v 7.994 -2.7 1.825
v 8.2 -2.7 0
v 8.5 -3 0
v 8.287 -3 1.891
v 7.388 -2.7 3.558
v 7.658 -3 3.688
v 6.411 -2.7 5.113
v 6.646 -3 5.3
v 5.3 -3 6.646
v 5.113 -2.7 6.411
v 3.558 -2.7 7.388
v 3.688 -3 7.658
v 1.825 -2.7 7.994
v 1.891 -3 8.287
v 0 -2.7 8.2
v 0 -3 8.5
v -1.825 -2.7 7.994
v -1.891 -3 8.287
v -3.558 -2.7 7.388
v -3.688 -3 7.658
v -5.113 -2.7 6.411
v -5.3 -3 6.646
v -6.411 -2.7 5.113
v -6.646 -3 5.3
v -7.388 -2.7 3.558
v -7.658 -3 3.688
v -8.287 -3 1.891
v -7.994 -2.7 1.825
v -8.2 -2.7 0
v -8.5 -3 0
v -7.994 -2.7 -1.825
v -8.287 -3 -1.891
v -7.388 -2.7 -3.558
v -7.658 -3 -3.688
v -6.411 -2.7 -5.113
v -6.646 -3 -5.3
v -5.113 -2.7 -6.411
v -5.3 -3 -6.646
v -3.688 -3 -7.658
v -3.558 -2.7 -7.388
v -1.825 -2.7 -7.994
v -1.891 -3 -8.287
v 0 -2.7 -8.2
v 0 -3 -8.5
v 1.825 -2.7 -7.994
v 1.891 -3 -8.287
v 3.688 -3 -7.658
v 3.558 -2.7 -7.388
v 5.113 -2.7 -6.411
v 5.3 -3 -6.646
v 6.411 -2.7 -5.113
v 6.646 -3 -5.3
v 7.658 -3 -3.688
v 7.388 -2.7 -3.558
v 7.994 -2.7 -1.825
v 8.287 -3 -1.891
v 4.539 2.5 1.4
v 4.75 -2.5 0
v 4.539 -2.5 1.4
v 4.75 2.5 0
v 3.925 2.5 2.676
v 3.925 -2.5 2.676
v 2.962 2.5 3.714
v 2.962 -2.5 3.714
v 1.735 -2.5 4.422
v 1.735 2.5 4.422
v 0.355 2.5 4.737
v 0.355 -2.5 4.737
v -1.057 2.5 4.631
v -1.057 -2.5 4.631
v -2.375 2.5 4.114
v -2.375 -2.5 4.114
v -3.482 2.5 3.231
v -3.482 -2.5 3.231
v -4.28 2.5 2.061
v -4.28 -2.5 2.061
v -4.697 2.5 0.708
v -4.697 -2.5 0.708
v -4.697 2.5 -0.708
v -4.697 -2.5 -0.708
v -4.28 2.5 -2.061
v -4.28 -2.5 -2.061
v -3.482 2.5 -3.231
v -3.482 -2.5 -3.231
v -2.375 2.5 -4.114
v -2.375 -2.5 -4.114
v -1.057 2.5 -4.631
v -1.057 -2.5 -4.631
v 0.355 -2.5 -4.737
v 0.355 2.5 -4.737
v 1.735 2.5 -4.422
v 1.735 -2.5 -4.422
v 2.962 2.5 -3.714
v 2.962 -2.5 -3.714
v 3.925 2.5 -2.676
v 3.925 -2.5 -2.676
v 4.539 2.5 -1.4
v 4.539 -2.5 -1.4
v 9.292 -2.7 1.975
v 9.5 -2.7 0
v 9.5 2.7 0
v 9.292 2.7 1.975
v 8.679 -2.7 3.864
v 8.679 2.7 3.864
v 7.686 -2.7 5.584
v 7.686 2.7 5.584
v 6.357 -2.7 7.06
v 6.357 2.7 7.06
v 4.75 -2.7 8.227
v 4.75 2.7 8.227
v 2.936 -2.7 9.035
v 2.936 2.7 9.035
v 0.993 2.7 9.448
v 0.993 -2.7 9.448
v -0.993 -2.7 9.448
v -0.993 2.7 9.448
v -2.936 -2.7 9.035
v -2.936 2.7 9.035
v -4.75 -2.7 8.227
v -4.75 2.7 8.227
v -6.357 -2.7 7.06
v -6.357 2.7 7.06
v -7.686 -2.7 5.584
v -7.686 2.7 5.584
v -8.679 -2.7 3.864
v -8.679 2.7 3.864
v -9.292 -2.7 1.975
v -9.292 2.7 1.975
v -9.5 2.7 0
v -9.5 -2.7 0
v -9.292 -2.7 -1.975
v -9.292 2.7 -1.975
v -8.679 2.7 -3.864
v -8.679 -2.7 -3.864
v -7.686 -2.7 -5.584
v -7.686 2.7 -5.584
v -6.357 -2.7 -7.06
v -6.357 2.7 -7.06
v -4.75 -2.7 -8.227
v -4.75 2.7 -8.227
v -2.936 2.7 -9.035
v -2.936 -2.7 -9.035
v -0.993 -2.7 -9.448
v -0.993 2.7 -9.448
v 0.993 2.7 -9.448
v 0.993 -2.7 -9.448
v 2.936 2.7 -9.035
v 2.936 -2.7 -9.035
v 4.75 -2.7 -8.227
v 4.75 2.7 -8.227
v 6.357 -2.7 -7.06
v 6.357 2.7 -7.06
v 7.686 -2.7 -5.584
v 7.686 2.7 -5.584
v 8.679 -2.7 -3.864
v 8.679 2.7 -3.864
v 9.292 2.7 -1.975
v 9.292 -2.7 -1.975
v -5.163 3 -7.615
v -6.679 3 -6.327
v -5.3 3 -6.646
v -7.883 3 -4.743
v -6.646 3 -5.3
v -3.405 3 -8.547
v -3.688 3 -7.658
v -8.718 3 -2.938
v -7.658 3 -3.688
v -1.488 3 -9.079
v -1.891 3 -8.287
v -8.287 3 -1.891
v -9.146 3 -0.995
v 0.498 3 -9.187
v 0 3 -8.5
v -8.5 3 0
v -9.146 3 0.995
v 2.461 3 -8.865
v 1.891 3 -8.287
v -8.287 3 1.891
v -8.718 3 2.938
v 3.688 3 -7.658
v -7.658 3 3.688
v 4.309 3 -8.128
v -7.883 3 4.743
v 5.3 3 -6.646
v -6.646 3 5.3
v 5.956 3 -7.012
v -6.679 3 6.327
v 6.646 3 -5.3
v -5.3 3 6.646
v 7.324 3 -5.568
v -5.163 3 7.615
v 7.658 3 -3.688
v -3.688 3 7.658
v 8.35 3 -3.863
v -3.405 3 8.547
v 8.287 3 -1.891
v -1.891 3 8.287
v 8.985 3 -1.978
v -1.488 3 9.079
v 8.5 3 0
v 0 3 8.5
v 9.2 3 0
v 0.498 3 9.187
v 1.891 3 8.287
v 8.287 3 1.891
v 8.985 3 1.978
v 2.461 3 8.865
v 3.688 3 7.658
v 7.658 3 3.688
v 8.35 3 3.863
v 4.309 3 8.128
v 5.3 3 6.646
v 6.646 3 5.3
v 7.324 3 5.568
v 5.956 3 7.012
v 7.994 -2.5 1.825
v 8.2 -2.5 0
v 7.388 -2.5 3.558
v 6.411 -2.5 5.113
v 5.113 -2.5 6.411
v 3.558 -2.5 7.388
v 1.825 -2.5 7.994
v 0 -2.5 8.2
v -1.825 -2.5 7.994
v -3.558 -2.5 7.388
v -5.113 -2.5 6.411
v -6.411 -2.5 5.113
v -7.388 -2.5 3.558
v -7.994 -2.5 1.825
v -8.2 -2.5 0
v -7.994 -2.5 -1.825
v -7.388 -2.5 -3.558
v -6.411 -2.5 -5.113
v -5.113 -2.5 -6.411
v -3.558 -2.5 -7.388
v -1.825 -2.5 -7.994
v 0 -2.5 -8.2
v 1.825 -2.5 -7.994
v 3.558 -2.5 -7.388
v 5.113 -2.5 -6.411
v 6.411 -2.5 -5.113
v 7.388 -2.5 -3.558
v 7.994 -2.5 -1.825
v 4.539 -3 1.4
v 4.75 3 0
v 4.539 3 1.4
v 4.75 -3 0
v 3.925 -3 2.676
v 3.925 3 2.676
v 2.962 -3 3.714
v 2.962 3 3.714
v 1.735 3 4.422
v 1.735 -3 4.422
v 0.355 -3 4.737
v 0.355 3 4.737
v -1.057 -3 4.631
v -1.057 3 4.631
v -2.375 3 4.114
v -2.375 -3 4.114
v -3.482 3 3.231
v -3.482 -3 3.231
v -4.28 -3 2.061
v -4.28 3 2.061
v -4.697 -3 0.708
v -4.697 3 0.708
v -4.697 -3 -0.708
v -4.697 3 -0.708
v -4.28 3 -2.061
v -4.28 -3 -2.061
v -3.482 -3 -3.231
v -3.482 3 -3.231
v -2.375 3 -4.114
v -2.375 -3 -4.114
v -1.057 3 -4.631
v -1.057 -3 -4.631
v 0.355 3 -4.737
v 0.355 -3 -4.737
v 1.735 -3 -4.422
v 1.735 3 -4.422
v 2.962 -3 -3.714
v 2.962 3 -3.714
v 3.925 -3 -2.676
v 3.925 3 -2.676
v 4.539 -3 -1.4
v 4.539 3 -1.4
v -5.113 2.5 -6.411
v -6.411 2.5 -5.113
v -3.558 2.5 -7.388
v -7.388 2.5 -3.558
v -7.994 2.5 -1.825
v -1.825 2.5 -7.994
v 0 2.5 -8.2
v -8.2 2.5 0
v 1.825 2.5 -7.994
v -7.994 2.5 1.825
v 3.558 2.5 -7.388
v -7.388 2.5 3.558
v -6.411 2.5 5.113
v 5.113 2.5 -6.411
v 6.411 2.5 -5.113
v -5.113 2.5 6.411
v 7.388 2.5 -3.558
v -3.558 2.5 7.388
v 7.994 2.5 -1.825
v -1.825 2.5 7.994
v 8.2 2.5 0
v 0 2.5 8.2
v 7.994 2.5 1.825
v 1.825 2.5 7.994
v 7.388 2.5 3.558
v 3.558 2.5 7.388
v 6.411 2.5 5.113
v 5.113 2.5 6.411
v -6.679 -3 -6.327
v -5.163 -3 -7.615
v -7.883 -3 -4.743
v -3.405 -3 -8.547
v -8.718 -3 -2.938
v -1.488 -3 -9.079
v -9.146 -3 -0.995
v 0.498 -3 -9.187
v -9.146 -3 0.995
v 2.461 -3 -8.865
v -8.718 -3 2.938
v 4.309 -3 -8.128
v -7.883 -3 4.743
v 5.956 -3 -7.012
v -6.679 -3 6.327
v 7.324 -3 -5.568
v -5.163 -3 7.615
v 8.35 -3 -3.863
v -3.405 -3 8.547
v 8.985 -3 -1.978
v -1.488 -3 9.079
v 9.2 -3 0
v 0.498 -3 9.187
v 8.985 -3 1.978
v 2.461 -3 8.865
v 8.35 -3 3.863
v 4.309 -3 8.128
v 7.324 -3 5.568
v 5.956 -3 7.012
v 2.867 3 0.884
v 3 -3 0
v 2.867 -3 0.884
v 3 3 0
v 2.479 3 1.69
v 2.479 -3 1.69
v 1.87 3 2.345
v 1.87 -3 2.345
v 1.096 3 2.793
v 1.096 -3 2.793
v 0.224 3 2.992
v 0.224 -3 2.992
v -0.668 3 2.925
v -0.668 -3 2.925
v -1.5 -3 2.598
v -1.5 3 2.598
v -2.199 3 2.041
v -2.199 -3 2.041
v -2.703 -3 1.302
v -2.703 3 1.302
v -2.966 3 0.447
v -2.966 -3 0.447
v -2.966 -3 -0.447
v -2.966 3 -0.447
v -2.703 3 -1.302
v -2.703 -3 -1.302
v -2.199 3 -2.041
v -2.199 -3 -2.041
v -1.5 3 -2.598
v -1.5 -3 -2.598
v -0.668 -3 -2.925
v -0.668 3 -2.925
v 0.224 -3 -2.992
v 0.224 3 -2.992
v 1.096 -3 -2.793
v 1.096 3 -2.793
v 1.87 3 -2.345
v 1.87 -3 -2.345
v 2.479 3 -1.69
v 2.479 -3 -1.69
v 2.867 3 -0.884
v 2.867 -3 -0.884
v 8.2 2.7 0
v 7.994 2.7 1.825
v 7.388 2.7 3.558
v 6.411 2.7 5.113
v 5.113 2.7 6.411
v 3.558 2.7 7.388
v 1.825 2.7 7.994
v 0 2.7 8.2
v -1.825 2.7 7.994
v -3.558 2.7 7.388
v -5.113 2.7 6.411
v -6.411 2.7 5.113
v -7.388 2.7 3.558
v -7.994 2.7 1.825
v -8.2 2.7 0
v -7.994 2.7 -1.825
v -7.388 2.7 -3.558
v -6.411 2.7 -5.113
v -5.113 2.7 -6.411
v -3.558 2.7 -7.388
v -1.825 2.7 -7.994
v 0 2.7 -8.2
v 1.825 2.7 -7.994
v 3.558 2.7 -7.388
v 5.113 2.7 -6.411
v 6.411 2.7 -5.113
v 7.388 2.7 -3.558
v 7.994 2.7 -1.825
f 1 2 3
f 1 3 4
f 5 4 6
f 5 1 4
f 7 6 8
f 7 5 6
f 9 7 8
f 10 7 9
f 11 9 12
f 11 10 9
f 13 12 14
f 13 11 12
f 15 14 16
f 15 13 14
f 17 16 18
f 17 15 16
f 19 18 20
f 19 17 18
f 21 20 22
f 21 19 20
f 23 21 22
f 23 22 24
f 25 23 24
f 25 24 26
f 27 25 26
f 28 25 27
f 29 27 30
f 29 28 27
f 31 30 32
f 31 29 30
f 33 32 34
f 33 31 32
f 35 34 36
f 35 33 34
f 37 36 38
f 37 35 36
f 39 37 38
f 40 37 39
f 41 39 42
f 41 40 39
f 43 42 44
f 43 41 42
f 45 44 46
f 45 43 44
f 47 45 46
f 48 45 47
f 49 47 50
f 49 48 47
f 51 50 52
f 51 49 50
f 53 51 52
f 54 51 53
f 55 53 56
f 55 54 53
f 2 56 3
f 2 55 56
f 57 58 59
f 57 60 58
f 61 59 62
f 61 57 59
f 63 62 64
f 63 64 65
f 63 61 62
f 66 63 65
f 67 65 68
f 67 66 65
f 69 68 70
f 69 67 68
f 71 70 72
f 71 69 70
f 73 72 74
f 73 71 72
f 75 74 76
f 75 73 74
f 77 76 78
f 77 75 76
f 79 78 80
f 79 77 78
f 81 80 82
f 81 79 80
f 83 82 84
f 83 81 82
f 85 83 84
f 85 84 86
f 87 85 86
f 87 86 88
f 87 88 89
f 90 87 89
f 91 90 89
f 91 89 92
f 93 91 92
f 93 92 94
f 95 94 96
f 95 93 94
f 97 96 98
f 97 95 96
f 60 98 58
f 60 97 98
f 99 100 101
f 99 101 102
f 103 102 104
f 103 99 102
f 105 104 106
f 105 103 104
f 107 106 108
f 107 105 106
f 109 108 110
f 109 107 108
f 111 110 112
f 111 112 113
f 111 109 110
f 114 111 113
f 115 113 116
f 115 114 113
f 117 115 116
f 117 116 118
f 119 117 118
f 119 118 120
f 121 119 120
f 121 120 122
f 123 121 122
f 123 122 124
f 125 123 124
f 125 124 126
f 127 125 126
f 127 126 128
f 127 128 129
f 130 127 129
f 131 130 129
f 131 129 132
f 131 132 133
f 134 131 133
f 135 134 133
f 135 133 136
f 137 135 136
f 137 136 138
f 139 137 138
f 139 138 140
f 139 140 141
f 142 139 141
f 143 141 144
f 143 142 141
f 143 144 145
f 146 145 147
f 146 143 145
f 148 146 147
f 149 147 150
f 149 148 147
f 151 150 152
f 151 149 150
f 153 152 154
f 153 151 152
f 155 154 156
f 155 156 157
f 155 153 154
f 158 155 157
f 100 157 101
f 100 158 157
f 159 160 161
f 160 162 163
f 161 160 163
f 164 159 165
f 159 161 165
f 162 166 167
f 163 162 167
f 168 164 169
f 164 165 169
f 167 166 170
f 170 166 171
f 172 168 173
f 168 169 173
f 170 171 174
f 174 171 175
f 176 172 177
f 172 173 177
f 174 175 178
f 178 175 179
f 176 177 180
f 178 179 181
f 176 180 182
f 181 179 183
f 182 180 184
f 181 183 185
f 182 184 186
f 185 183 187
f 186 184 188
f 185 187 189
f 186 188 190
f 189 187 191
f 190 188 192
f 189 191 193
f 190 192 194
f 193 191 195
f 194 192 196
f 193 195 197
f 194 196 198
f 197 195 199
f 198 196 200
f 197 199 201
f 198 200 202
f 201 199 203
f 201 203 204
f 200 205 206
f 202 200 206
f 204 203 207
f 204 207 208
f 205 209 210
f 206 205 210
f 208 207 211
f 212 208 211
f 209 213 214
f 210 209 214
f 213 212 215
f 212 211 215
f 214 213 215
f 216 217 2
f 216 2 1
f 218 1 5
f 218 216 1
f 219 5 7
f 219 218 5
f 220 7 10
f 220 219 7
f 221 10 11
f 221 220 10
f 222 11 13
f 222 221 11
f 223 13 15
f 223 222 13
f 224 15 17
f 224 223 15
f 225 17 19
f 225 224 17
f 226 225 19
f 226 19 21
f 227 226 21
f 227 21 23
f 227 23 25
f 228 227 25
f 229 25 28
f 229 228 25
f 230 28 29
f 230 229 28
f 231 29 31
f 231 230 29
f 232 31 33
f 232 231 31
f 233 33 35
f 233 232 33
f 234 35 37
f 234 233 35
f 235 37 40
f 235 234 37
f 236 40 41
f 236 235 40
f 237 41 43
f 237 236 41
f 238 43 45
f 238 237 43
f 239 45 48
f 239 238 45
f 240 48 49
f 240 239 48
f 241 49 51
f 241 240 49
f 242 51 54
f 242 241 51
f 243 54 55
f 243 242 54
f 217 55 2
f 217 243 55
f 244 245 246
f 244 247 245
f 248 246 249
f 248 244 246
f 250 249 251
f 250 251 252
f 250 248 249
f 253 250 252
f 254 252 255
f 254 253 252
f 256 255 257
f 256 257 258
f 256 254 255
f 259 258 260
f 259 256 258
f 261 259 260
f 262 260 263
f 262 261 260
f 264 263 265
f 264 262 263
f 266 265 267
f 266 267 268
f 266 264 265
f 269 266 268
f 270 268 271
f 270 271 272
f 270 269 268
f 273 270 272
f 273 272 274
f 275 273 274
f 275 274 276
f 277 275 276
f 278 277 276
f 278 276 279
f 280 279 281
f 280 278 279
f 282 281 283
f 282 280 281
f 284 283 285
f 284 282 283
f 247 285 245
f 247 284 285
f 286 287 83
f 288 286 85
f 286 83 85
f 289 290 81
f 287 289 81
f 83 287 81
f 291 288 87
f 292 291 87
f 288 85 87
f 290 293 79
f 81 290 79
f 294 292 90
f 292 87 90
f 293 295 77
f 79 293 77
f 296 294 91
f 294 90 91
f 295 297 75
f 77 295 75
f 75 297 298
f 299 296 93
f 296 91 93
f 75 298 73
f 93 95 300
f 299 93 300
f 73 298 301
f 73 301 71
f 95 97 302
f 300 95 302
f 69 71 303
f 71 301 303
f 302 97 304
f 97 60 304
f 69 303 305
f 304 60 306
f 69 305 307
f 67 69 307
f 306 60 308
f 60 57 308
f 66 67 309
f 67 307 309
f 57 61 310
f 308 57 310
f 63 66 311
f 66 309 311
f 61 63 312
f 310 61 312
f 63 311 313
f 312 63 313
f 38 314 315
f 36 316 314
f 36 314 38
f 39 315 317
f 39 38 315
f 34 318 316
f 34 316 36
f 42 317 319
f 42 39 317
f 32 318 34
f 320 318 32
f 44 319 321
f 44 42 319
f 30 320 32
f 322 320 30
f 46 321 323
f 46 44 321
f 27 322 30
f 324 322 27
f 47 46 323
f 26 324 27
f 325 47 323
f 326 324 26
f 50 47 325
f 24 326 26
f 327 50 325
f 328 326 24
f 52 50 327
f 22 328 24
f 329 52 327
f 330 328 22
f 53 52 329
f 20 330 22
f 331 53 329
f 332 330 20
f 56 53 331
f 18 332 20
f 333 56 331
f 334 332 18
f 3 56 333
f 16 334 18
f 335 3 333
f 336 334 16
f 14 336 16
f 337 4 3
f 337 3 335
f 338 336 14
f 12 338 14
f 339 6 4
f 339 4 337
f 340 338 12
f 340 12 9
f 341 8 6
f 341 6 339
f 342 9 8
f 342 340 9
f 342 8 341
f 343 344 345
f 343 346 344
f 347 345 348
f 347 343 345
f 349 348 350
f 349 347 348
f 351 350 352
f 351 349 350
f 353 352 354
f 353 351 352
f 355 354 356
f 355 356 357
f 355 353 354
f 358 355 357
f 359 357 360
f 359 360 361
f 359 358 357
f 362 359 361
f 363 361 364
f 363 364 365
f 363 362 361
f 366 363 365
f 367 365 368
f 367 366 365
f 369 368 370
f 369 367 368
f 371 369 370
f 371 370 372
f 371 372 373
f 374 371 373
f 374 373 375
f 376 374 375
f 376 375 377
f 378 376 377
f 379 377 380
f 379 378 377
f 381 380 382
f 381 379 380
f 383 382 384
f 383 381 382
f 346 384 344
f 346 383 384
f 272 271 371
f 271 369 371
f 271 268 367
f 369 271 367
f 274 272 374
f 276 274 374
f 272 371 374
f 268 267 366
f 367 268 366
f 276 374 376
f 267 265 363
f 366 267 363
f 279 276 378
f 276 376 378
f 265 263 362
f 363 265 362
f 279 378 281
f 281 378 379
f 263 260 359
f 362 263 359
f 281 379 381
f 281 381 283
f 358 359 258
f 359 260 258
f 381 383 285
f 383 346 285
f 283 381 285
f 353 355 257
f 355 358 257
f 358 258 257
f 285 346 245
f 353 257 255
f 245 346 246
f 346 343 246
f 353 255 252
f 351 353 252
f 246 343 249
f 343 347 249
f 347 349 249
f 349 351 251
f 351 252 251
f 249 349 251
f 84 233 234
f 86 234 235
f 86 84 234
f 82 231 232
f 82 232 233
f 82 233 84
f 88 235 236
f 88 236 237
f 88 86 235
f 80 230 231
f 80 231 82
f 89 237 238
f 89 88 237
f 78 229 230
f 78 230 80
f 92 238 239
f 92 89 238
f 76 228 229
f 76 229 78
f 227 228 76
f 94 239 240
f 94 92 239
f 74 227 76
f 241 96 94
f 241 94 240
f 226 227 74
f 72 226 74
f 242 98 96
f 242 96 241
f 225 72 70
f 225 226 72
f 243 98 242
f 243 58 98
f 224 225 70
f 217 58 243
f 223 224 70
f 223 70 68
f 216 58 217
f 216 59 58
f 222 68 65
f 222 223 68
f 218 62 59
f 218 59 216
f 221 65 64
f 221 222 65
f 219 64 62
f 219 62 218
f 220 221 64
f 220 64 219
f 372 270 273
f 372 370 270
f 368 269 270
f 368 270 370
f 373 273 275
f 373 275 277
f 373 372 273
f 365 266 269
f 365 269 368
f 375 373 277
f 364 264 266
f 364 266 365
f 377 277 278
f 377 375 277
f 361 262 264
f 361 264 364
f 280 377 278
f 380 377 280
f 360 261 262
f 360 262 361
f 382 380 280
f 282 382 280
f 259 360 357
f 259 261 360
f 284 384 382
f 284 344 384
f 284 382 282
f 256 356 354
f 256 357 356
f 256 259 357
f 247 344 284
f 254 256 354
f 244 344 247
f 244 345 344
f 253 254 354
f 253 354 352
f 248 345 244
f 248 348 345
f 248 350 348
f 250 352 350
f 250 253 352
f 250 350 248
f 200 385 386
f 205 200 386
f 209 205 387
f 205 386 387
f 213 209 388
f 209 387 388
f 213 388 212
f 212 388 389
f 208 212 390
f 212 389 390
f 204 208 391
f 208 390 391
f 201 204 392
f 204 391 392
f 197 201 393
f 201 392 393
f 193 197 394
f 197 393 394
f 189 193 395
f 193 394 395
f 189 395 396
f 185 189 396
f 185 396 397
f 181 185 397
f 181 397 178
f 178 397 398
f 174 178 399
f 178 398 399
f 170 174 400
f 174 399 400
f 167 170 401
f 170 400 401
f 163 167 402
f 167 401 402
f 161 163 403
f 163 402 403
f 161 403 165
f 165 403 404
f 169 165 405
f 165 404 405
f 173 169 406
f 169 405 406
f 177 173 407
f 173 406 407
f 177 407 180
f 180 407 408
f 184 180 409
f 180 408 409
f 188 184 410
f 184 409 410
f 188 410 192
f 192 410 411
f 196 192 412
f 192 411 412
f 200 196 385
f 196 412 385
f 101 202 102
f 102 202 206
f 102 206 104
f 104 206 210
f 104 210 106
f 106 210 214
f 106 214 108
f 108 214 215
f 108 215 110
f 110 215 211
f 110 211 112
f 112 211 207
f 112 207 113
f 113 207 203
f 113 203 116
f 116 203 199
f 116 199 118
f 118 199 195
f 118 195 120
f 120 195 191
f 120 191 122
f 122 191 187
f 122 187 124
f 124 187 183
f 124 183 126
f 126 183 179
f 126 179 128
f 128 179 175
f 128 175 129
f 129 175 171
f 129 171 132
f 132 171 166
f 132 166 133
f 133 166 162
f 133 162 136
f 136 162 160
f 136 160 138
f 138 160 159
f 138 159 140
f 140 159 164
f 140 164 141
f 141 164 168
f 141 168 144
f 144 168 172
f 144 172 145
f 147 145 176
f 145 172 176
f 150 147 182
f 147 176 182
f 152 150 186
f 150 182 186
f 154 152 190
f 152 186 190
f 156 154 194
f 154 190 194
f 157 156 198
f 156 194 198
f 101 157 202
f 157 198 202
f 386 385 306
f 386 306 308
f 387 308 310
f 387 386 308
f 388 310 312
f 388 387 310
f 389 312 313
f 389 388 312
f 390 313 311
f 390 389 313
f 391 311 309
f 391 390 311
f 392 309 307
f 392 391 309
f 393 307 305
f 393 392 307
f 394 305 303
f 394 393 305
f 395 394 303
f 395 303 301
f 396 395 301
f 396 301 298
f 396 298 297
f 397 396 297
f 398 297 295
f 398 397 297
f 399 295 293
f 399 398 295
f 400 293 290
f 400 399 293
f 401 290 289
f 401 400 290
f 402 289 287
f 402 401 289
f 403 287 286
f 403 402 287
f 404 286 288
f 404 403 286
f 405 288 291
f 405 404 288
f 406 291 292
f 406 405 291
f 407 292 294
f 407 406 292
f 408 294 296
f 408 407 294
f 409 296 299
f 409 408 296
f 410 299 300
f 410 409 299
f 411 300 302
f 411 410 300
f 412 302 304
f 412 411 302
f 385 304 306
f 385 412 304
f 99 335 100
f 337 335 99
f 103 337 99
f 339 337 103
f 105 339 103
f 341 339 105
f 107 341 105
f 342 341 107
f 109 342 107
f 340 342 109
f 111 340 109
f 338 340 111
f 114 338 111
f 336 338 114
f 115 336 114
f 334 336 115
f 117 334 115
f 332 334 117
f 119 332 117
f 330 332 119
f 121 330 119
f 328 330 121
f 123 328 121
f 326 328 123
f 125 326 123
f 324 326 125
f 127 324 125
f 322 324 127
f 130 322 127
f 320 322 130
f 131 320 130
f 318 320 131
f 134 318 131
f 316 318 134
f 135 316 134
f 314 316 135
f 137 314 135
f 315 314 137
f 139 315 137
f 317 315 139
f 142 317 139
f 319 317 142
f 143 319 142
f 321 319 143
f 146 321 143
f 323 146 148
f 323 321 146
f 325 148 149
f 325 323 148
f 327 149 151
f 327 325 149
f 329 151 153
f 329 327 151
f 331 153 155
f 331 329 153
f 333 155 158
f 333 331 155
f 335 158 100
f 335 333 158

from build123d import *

# Parameters (mm, degrees)
F0_R     = 9.5
F0_R_2   = 8.2
F1_DEPTH = 3
F0_R_3   = 4.75
F2_DEPTH = 2.5
F3_SIZE  = 0.3
F0_R_4   = 3
F4_DEPTH = 3


with BuildPart() as f1:
    # F0 (on Front) → F1 (new body, symmetric)
    with BuildSketch(Plane.XZ):
        Circle(F0_R)
        Circle(F0_R_2, mode=Mode.SUBTRACT)
    extrude(amount=F1_DEPTH, both=True)

    # F0 (on Front) → F2 (join, symmetric)
    with BuildSketch(Plane.XZ):
        Circle(F0_R_2)
        Circle(F0_R_3, mode=Mode.SUBTRACT)
    extrude(amount=F2_DEPTH, both=True)

    # F3
    f3_edges = [f1.edges().sort_by_distance(p)[0] for p in [
        (-9.5, -3, 0),
        (-8.2, -3, 0),
        (-9.5, 3, 0),
        (-8.2, 3, 0),
    ]]
    chamfer(f3_edges, length=F3_SIZE)


with BuildPart() as f4:
    # F0 (on Front) → F4 (new body, symmetric)
    with BuildSketch(Plane.XZ):
        Circle(F0_R_3)
        Circle(F0_R_4, mode=Mode.SUBTRACT)
    extrude(amount=F4_DEPTH, both=True)


solid = Compound([f1.part, f4.part])
